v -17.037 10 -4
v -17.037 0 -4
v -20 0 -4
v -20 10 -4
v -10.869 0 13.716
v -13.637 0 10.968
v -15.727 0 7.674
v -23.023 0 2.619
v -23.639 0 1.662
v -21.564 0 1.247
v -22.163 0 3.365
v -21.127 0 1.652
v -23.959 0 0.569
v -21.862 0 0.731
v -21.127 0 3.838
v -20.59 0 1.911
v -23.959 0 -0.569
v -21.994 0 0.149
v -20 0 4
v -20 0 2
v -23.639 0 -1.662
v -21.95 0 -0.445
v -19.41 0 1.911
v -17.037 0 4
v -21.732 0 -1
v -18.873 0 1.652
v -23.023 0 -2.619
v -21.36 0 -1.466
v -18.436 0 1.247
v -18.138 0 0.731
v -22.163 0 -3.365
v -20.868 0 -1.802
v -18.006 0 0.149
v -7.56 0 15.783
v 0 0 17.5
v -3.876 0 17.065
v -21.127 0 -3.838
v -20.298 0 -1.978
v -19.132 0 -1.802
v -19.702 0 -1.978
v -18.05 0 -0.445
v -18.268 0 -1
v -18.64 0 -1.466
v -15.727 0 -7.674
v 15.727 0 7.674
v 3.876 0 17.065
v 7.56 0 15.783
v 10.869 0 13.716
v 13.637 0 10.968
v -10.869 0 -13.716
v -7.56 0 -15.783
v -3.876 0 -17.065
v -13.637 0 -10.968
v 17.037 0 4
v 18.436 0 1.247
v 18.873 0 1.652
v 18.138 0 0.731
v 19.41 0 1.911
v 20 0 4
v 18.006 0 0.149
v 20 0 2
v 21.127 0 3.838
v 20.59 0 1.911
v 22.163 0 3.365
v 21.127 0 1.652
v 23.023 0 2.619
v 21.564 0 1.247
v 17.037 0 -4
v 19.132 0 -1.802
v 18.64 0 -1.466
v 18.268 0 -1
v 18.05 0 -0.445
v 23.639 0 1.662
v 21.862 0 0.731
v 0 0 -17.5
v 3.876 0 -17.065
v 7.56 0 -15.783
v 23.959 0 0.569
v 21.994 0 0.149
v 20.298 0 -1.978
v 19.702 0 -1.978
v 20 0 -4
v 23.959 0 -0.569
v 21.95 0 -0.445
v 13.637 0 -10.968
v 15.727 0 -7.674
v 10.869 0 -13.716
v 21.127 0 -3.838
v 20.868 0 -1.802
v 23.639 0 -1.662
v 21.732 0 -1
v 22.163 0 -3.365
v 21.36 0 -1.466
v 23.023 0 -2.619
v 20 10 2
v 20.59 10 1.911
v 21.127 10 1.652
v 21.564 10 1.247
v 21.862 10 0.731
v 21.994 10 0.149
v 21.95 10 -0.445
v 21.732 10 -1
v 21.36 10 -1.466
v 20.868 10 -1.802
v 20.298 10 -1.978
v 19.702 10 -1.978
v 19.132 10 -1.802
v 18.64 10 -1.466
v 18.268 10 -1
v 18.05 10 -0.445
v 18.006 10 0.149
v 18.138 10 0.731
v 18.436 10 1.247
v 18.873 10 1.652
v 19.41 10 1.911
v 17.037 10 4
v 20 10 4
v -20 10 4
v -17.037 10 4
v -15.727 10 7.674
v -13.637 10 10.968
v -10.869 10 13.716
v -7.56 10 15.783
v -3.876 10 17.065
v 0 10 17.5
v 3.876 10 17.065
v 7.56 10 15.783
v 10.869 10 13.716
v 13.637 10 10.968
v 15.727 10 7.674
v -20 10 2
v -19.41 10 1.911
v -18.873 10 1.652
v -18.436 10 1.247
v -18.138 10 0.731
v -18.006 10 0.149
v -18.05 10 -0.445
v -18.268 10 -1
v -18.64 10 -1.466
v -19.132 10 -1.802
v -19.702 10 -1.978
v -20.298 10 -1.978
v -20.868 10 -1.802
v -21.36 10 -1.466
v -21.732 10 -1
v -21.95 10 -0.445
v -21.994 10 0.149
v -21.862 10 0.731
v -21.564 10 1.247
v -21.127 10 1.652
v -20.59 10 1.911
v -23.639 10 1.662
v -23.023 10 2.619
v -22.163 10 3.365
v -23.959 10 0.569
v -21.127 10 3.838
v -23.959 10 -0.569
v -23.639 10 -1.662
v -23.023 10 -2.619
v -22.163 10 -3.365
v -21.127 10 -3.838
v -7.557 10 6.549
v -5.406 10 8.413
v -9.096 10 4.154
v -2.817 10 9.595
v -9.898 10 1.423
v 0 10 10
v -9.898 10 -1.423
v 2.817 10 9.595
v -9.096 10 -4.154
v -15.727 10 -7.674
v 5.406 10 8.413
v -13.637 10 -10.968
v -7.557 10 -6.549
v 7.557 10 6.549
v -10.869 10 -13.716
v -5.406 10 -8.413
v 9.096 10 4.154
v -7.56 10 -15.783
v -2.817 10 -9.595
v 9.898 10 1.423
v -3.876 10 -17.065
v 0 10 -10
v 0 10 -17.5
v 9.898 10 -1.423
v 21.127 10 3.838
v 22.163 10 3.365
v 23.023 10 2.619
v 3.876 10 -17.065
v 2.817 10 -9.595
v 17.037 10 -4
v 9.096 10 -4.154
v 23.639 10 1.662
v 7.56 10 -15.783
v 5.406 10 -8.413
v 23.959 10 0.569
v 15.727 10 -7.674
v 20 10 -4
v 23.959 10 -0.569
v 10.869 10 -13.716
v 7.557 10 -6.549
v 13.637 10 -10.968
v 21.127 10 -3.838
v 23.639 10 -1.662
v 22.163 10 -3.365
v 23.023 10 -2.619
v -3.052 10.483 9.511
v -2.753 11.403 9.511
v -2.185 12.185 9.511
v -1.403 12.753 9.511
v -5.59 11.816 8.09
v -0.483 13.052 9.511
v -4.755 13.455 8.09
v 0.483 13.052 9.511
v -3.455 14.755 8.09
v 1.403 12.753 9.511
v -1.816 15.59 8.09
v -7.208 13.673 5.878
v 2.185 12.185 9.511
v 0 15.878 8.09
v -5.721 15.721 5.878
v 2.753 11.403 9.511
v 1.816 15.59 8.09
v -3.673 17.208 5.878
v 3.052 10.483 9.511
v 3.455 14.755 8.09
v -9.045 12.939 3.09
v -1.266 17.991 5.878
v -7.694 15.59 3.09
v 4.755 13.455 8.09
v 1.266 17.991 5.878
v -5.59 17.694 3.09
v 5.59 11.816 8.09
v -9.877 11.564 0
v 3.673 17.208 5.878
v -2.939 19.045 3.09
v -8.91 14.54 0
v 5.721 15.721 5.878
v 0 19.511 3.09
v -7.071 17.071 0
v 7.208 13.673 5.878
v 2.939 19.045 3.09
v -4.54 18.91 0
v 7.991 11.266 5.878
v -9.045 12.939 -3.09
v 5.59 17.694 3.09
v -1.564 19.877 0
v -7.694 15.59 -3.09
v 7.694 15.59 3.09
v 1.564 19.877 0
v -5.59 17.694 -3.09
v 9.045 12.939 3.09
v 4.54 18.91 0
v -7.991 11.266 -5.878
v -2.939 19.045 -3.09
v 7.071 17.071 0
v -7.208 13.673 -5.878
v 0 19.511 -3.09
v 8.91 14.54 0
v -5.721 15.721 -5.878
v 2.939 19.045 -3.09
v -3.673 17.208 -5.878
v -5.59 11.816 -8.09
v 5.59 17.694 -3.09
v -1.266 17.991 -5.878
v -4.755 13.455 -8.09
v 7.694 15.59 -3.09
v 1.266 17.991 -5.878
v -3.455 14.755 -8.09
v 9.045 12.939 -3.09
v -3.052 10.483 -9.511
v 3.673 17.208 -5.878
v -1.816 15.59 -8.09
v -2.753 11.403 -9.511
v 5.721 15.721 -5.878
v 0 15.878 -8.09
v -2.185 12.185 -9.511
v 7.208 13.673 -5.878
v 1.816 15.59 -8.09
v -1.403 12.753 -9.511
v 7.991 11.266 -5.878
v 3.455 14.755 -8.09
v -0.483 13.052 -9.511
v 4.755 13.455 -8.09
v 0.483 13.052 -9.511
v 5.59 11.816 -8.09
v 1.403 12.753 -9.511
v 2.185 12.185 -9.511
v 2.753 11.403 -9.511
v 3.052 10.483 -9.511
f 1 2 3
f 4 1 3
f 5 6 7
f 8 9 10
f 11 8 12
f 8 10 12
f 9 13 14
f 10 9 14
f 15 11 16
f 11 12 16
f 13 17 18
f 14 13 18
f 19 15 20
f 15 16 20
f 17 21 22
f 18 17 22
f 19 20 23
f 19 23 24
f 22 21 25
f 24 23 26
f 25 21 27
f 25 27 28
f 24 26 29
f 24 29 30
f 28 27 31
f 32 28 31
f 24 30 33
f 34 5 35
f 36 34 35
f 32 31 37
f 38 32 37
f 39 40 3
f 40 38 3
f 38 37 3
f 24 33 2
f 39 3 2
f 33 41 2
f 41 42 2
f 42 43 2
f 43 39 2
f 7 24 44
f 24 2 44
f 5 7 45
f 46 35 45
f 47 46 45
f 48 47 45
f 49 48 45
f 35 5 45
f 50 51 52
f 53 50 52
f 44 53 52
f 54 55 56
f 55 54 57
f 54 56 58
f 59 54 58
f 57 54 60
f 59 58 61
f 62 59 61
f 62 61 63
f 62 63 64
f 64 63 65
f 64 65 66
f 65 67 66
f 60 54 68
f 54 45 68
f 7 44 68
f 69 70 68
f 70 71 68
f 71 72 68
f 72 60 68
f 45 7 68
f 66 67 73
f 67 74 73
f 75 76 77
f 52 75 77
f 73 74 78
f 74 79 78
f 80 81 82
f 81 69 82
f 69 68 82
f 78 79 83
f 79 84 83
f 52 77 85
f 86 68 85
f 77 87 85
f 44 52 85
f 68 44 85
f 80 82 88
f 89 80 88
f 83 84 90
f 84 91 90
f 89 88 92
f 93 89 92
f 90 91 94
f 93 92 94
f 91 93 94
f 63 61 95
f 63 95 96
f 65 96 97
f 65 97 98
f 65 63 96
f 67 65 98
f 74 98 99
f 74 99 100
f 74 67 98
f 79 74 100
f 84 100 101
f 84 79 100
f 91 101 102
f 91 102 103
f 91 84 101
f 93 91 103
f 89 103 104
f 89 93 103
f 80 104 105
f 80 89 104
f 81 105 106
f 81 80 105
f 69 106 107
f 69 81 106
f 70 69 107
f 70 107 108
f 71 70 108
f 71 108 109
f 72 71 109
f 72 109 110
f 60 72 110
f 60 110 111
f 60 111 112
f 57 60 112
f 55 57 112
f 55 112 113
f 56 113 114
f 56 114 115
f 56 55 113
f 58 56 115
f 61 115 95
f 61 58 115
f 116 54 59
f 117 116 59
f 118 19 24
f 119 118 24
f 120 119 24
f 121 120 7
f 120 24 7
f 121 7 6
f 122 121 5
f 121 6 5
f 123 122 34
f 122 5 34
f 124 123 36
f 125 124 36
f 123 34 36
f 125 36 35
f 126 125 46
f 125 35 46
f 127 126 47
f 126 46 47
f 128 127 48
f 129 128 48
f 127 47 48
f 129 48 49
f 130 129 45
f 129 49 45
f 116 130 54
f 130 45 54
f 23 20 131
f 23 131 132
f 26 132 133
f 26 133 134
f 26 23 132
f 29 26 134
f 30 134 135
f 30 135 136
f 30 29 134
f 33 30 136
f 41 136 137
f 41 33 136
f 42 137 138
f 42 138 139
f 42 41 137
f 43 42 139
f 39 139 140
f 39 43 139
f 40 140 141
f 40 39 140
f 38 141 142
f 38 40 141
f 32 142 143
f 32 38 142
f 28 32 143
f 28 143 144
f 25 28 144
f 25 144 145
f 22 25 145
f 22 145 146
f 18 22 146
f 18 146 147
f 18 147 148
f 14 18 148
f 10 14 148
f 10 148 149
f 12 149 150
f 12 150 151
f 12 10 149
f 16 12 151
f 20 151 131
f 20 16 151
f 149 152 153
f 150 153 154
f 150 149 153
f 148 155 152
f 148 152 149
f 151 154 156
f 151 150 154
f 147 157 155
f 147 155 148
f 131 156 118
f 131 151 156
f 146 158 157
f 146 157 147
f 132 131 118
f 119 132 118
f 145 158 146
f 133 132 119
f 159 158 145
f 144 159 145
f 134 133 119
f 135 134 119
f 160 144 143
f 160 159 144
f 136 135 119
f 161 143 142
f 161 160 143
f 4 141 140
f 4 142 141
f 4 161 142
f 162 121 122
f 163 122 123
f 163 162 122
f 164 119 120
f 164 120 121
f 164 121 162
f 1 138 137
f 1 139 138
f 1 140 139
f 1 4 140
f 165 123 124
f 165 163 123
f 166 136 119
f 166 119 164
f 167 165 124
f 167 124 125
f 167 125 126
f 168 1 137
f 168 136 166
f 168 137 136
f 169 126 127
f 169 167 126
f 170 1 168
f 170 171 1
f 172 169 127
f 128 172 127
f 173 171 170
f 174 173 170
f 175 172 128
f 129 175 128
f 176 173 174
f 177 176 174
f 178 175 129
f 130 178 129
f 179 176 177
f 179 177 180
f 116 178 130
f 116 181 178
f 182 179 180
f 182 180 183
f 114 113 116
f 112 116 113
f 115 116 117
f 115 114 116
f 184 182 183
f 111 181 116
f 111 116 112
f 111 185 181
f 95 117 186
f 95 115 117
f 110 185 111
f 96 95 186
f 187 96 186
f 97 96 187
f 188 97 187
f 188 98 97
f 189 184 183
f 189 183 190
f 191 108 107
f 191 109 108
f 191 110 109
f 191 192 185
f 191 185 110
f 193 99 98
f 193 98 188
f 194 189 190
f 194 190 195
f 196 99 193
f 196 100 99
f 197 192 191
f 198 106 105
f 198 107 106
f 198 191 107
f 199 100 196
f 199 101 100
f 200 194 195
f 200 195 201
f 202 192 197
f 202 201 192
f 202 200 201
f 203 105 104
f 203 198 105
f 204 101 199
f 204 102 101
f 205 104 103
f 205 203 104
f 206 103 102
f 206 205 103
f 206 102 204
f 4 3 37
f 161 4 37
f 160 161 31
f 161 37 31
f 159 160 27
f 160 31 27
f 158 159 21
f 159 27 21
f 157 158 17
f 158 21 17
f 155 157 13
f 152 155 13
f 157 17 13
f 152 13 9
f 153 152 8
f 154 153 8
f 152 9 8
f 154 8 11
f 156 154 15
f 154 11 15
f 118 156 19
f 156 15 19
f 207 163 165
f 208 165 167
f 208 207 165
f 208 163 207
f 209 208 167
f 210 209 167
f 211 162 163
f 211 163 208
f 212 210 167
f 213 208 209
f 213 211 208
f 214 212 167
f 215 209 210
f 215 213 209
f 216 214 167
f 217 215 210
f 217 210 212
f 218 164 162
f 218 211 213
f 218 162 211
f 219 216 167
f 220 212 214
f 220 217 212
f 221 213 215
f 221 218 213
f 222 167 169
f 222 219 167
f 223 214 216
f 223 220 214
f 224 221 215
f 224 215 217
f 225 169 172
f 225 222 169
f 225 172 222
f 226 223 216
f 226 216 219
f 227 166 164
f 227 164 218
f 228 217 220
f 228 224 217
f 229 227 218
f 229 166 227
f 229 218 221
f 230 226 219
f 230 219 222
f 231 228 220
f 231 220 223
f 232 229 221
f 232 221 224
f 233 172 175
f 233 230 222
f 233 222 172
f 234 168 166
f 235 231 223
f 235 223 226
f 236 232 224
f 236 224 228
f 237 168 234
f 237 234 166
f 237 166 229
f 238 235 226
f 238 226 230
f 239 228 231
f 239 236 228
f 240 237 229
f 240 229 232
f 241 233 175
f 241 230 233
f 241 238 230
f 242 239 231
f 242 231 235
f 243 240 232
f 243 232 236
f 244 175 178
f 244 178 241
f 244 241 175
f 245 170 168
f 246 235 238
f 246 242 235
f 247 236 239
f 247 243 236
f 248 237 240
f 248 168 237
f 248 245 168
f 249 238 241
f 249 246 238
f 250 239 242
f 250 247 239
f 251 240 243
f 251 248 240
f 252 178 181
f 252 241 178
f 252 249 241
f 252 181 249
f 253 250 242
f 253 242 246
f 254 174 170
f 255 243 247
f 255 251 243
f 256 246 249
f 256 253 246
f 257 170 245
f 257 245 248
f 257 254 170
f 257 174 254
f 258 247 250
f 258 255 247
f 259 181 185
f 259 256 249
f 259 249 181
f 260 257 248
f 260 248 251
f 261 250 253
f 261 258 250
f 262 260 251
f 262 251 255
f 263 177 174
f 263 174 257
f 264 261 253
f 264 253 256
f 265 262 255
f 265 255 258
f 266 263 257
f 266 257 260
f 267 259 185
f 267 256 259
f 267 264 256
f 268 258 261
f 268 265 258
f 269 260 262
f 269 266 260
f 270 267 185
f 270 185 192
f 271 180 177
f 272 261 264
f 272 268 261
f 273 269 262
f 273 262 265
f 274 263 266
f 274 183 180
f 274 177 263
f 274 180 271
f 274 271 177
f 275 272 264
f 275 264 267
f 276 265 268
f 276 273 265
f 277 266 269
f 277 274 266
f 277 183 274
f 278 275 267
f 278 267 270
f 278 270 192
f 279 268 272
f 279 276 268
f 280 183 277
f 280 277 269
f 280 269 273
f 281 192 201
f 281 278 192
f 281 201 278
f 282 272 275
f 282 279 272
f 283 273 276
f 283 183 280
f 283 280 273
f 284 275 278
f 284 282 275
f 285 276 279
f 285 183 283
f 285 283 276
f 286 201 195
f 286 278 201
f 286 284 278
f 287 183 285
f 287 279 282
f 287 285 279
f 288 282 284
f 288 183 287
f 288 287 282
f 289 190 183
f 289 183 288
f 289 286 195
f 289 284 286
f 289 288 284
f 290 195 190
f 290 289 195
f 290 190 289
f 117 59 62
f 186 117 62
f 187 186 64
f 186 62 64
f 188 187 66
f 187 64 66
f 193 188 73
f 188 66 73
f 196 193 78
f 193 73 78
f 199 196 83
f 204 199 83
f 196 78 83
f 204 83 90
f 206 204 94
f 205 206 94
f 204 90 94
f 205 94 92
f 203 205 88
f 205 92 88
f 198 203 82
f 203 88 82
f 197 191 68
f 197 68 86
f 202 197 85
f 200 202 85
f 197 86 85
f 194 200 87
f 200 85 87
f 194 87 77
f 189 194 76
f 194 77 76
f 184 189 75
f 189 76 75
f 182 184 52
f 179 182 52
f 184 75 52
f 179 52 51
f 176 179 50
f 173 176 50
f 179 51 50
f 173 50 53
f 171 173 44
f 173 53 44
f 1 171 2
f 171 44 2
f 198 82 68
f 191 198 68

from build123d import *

# Parameters (mm, degrees)
SKETCH1_R           = 17.5
SKETCH1_R_2         = 2
BOSS_EXTRUDE1_DEPTH = 10
REVOLVE1_ANGLE      = 180


with BuildPart() as part:
    # Sketch1 → Boss-Extrude1 (new body)
    # profile 1 of 2: a face of its own
    with BuildSketch(Plane(origin=(0, 0, 0), x_dir=(1, 0, 0), z_dir=(0, 1, 0))):
        Circle(SKETCH1_R)
    # profile 2 of 2: a face of its own
    with BuildSketch(Plane(origin=(0, 0, 0), x_dir=(1, 0, 0), z_dir=(0, 1, 0))):
        with BuildLine():
            Line((-20, -4), (20, -4))
            ThreePointArc((20, -4), (24, 0), (20, 4))
            Line((20, 4), (-20, 4))
            ThreePointArc((-20, 4), (-24, 0), (-20, -4))
        make_face()
        with Locations(Location((-20, 0, 0), (0, 0, 270))):
            Circle(SKETCH1_R_2, mode=Mode.SUBTRACT)
        with Locations(Location((20, 0, 0), (0, 0, 270))):
            Circle(SKETCH1_R_2, mode=Mode.SUBTRACT)
    extrude(amount=BOSS_EXTRUDE1_DEPTH)

    # Sketch2 → Revolve1 (revolve)
    with BuildSketch(Plane(origin=(0, 10, 0), x_dir=(1, 0, 0), z_dir=(0, 1, 0))):
        with BuildLine():
            Line((0, 10), (0, -10))
            ThreePointArc((0, -10), (-10, 0), (0, 10))
        make_face()
    revolve(axis=Axis((0, 10, -10), (0, 0, -1)), revolution_arc=REVOLVE1_ANGLE)


solid = part.part
